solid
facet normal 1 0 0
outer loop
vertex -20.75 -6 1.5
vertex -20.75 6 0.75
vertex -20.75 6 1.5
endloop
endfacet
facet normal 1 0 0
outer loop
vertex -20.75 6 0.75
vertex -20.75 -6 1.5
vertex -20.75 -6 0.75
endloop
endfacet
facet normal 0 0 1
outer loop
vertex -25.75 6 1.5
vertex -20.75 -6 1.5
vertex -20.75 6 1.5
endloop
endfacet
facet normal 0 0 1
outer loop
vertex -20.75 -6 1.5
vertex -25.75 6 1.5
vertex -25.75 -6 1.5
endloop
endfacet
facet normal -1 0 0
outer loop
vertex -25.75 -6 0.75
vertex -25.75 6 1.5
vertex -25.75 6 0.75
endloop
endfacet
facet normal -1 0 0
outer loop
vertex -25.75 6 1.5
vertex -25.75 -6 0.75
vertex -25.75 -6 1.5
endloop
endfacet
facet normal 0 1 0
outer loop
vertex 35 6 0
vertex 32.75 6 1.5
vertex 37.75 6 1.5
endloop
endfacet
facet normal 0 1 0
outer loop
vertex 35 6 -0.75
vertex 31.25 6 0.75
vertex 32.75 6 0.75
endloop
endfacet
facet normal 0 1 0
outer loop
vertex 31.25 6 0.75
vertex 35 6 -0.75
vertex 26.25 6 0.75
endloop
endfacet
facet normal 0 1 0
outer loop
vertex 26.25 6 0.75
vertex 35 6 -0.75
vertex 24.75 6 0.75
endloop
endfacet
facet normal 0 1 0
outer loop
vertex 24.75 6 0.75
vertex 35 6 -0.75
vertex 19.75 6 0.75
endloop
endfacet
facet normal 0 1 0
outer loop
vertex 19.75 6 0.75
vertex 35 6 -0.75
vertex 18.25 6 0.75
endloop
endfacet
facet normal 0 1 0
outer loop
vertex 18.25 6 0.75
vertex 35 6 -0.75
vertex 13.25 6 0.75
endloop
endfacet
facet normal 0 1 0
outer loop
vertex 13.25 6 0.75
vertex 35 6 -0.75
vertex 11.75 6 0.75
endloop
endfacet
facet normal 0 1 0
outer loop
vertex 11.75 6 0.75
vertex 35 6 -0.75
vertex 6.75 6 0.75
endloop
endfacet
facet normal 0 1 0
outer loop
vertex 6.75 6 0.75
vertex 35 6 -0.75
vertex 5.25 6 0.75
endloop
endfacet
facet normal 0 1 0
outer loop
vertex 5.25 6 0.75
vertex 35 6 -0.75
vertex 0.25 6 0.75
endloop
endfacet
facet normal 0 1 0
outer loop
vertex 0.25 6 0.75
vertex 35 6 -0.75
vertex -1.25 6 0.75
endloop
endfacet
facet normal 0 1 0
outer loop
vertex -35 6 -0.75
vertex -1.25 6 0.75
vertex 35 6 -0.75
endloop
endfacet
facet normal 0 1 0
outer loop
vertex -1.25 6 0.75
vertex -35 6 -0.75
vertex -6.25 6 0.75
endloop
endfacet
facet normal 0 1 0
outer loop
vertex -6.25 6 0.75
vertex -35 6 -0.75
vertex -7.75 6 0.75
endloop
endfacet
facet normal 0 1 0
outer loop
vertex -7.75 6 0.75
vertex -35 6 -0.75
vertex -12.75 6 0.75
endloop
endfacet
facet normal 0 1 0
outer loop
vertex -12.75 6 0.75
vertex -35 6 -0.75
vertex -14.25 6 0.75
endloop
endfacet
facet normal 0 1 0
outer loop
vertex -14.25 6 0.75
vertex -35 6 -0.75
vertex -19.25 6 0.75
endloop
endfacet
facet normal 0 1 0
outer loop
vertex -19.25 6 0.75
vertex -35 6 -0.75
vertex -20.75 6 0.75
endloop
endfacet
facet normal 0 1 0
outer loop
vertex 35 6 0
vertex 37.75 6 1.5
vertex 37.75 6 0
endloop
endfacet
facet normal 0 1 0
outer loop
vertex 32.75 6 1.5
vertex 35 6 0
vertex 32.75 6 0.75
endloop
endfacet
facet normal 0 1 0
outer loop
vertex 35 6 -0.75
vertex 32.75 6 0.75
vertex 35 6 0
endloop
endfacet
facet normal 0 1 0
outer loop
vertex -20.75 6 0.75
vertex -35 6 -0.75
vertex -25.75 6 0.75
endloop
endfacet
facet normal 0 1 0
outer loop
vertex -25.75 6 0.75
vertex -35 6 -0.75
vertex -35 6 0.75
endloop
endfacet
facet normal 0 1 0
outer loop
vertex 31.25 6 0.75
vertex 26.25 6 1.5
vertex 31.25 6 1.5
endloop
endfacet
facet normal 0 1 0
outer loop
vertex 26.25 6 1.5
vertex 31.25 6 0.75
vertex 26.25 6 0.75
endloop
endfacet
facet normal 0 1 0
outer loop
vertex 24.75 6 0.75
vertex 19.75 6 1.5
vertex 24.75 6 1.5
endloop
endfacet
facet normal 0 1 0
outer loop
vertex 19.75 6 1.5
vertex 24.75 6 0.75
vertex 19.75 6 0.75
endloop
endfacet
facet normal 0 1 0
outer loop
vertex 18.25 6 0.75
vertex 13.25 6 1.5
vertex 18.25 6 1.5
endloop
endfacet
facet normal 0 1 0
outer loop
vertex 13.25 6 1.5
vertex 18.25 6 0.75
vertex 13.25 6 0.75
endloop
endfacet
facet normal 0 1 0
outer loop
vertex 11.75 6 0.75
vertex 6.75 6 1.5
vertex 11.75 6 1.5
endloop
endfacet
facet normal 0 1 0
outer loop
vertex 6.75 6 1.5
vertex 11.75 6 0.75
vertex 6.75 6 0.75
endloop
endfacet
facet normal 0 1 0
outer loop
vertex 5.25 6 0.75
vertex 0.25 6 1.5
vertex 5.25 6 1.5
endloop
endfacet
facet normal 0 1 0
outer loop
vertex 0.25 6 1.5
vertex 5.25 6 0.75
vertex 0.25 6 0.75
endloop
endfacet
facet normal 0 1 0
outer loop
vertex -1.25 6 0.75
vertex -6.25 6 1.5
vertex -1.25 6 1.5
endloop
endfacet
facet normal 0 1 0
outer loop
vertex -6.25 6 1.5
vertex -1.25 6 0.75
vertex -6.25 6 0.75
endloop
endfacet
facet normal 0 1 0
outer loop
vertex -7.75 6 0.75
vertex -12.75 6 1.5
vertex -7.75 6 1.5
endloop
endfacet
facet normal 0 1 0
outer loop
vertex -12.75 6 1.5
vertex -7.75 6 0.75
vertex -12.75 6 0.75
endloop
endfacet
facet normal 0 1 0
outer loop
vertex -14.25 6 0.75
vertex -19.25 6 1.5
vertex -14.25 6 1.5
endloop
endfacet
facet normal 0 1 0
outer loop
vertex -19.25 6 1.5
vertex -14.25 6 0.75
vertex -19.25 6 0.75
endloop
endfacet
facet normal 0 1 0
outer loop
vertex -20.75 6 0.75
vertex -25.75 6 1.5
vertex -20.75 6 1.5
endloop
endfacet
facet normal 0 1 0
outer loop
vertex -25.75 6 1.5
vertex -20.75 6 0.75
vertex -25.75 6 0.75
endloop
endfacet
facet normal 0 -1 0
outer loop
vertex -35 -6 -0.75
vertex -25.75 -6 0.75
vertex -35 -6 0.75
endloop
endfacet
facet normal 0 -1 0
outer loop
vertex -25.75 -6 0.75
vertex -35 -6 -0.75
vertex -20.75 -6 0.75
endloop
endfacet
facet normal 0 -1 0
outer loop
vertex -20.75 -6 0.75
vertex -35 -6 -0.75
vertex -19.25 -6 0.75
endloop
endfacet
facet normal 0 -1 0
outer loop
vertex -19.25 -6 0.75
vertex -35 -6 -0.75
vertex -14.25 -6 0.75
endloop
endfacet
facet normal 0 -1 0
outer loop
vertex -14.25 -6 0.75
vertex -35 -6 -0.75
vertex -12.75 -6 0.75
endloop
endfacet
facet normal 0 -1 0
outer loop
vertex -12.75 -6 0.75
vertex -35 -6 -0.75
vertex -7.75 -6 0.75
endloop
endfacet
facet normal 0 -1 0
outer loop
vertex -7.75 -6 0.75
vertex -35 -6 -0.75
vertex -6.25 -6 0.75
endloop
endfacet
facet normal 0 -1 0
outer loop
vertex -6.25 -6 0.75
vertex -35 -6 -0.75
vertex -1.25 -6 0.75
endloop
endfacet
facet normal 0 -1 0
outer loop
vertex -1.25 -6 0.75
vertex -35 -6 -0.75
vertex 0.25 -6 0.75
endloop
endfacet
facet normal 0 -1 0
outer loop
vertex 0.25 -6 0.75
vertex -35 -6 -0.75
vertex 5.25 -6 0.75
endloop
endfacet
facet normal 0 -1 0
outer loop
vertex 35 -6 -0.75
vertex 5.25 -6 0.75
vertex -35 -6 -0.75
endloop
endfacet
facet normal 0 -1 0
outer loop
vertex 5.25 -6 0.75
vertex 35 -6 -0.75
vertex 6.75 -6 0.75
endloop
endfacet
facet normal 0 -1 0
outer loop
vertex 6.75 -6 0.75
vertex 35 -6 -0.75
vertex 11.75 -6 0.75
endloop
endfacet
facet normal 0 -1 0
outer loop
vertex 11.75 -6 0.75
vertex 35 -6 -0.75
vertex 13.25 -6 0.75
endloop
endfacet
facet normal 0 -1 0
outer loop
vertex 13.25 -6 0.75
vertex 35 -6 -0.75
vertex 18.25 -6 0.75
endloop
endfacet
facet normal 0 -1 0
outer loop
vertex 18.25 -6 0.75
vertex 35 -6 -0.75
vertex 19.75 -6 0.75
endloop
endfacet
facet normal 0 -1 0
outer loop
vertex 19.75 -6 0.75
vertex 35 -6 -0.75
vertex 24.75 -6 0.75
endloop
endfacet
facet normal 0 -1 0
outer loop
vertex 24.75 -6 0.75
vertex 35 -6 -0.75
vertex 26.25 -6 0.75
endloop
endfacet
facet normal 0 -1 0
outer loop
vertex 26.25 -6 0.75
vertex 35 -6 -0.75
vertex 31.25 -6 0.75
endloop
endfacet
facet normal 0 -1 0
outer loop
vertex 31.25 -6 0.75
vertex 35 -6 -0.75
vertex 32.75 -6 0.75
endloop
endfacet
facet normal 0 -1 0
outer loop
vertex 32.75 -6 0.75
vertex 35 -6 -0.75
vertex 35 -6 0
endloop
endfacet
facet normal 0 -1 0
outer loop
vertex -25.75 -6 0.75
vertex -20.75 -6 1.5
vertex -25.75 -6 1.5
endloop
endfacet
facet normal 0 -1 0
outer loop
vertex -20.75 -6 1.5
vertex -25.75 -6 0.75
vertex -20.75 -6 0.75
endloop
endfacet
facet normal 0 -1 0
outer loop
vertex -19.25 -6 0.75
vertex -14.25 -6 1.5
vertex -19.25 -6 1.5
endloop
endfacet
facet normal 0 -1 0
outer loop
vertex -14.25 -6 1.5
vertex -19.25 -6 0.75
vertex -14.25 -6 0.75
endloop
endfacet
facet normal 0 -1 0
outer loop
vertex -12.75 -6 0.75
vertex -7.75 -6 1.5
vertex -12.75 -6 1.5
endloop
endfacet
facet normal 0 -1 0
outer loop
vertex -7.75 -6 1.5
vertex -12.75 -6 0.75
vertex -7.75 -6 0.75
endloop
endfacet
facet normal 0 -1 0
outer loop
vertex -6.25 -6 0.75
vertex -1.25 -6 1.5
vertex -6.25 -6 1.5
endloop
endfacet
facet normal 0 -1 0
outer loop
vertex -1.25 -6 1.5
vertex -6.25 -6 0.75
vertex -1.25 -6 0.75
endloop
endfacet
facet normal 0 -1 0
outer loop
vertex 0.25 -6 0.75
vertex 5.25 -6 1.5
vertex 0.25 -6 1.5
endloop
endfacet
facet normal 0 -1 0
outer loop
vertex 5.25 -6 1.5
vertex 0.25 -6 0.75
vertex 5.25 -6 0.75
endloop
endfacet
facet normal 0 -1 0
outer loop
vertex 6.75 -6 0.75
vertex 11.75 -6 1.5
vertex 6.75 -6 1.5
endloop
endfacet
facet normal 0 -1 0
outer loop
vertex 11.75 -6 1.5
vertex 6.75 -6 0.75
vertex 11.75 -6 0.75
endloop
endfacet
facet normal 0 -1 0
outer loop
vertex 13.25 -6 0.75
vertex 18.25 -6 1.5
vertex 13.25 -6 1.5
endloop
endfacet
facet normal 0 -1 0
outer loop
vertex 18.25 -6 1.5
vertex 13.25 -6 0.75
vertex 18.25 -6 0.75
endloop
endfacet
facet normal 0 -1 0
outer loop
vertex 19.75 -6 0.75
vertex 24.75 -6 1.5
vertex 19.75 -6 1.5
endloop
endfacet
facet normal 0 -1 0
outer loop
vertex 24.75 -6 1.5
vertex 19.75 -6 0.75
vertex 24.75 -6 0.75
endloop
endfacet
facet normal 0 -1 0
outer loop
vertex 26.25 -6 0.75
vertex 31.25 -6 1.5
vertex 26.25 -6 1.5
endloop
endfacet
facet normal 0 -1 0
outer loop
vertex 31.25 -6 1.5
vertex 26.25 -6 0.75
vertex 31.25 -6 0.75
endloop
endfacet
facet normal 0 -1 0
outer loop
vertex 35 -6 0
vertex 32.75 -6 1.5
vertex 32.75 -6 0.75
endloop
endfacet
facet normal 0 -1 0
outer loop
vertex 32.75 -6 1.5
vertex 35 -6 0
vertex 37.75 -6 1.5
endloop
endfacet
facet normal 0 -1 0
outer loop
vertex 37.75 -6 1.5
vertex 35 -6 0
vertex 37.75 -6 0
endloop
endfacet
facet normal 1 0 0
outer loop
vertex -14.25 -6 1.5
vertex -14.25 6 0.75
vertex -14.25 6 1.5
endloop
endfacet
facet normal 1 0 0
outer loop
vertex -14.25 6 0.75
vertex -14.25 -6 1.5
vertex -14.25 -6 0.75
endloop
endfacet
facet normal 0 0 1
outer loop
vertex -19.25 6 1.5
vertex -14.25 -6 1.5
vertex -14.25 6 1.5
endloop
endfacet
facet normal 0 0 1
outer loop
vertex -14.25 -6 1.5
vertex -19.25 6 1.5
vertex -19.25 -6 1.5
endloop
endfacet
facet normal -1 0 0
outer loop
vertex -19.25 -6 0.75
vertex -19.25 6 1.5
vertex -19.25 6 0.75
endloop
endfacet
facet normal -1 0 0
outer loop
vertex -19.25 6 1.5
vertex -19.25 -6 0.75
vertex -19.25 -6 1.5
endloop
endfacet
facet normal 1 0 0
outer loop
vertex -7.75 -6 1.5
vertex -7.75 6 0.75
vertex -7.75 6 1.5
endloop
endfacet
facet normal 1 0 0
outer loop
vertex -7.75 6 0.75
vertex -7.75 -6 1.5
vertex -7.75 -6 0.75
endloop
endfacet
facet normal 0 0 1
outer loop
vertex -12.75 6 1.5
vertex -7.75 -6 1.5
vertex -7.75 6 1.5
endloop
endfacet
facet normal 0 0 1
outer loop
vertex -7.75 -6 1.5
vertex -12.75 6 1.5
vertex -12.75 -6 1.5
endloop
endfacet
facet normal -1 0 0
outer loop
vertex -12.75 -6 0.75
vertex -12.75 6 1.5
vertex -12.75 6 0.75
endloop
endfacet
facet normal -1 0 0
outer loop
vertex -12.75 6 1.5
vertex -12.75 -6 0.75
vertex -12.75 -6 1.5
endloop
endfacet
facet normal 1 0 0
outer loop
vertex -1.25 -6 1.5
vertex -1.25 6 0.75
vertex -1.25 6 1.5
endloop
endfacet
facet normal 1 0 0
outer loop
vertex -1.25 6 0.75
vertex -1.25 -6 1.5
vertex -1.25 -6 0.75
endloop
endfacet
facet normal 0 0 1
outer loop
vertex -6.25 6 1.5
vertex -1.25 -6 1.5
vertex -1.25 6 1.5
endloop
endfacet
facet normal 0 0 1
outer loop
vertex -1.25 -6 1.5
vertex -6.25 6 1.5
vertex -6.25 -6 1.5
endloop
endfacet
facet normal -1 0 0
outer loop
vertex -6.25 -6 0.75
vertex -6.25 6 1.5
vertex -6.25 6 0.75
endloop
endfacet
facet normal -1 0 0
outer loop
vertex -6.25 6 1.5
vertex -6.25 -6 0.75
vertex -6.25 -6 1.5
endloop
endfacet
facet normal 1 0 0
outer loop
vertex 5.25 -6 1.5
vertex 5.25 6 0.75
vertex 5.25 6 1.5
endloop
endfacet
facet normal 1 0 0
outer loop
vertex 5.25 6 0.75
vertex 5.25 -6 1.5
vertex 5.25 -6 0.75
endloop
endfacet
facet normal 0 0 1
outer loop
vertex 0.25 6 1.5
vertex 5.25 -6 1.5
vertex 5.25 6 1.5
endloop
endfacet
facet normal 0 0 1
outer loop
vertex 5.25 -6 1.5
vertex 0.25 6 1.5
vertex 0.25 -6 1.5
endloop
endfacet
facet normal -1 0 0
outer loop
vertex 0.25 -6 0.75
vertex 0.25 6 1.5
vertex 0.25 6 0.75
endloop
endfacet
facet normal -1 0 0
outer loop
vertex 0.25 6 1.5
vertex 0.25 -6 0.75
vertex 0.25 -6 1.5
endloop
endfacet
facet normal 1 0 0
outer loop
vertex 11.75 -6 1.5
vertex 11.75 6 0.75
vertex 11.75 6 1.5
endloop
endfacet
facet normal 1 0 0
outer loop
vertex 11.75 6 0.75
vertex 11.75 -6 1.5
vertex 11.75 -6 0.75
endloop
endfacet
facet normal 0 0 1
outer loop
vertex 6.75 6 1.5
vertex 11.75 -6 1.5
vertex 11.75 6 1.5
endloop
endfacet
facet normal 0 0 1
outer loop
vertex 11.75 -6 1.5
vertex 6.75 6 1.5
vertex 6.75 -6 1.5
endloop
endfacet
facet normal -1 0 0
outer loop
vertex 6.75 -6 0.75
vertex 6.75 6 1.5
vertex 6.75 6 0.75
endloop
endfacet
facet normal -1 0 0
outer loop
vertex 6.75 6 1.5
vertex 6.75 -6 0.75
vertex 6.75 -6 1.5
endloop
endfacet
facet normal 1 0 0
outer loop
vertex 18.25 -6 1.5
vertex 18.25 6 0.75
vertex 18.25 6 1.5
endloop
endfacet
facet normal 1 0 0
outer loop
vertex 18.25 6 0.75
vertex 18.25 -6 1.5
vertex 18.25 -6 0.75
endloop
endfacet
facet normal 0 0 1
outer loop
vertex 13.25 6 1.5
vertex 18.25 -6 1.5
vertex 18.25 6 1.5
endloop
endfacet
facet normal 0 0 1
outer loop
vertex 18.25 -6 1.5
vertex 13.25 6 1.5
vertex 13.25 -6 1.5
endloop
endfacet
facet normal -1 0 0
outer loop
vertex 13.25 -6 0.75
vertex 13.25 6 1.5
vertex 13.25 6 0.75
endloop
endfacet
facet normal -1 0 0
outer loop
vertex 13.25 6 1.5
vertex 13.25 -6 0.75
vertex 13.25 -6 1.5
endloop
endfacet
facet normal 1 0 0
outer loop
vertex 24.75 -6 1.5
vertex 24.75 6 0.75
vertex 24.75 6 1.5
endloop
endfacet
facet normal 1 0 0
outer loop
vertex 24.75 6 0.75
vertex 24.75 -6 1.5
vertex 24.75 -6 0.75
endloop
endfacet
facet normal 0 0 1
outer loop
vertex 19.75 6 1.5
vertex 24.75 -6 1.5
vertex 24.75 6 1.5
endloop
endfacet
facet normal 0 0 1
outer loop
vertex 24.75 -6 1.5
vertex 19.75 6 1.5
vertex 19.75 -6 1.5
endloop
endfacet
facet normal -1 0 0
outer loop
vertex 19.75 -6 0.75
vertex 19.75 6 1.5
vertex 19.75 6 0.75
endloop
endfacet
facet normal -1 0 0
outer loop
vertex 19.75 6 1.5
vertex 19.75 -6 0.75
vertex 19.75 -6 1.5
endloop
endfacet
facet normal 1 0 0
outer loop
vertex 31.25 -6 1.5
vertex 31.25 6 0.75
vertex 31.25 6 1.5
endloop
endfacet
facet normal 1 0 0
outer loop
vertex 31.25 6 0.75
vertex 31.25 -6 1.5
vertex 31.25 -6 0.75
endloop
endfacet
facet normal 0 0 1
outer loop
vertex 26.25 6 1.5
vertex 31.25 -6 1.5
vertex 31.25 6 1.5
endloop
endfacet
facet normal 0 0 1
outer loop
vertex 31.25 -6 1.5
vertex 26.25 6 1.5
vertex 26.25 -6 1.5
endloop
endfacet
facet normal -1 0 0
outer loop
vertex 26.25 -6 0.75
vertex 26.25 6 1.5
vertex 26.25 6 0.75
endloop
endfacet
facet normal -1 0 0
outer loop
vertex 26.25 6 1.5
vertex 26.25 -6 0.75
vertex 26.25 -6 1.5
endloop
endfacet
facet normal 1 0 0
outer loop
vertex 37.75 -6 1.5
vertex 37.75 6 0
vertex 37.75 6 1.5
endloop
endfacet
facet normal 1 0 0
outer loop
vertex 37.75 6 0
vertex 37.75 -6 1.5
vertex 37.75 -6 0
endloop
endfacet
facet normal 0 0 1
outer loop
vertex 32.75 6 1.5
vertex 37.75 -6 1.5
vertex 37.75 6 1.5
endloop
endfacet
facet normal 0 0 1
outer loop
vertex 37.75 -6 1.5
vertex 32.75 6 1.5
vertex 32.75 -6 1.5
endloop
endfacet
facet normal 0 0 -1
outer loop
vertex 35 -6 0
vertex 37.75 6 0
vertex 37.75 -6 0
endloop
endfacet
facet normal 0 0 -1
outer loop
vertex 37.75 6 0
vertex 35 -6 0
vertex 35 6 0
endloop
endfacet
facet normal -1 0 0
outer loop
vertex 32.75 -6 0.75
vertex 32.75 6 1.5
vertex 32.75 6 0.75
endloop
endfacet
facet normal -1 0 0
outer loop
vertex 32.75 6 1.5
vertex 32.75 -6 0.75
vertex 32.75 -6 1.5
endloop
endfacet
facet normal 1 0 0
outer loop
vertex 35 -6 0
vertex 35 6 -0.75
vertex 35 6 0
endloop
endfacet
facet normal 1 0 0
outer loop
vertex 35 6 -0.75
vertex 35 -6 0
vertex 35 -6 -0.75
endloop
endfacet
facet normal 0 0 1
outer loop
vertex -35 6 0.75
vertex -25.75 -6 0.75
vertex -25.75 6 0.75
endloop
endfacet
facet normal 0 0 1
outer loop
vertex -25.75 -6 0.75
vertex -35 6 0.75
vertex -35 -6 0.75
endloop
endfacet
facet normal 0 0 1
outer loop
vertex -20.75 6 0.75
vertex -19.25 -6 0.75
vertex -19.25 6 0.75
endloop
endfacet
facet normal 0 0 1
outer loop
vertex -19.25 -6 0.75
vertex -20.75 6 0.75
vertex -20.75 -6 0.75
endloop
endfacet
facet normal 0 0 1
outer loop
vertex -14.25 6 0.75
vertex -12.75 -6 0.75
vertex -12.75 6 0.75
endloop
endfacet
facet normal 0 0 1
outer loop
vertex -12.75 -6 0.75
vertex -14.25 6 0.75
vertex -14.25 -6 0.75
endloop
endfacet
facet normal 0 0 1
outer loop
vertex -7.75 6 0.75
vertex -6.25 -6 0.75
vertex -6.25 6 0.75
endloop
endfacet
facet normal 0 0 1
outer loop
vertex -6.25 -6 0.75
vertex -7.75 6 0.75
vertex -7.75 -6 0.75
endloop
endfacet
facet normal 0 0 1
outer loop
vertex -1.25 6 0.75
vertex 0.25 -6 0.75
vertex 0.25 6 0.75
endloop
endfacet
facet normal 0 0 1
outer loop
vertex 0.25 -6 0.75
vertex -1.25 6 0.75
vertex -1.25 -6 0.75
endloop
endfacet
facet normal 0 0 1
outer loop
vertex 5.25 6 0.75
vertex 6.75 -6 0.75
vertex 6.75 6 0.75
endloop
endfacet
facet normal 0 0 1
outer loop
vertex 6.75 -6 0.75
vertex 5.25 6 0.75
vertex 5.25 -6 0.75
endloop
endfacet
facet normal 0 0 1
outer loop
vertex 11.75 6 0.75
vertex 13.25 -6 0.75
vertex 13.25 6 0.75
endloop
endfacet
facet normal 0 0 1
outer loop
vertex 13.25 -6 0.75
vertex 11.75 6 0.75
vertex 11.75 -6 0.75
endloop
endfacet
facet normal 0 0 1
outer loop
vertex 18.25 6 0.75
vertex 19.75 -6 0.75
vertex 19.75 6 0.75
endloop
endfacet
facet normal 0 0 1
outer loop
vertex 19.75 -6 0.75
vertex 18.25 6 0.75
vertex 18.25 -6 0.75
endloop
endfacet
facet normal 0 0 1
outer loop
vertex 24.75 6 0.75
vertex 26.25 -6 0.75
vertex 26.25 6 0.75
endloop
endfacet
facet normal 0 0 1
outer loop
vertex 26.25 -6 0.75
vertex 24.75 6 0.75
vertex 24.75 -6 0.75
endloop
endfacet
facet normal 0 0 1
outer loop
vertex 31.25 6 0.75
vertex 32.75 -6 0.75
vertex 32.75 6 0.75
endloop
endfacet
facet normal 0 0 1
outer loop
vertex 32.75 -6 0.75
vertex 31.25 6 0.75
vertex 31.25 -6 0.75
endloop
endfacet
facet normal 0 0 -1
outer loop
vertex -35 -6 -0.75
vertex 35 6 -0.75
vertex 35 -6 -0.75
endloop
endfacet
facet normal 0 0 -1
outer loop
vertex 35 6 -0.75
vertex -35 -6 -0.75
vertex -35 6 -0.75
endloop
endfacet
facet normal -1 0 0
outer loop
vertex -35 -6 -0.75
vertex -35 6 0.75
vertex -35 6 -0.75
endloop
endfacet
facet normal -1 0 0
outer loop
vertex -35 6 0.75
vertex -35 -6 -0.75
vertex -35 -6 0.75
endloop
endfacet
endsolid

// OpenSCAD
// Dimensions for 10-well agarose gel comb
// Units: millimetres

// Overall plate thickness (Z direction)
thick = 1.5;

// Spine dimensions
spine_len = 70;      // Length along X
spine_wid = 12;      // Width along Y

// Tooth dimensions
tooth_wid = 5.0;     // Width along X
tooth_len = 12;      // Length along Y (hanging in -Y)

// Gap between teeth
gap_wid = 1.5;       // Gap along X

// Number of teeth
num_teeth = 10;

// Calculate total width of teeth + gaps
// Total width = num_teeth * tooth_wid + (num_teeth - 1) * gap_wid
total_tooth_width = num_teeth * tooth_wid + (num_teeth - 1) * gap_wid;

// Centering the tooth row on the spine in X
// Spine is centered at X=0, so we shift the tooth row to align with spine center
tooth_row_offset_x = (spine_wid - total_tooth_width) / 2;

// Calculate the Y position of the teeth
// Spine extends from Y = -spine_wid/2 to Y = +spine_wid/2
// Teeth hang in -Y direction from the spine edge (Y = -spine_wid/2)
// Tooth length is 12mm, so they extend from Y = -spine_wid/2 down to Y = -spine_wid/2 - 12
tooth_start_y = -spine_wid / 2;
tooth_end_y = tooth_start_y - tooth_len;

// Build the comb
module comb() {
    // 1. Create the spine (flat plate)
    // Centered at origin, lying on XY plane (Z=0 to Z=thick)
    translate([0, 0, 0])
        cube([spine_len, spine_wid, thick], center = true);

    // 2. Create the teeth
    // We use a loop to create each tooth
    for (i = [0 : num_teeth - 1]) {
        // Calculate X position for this tooth
        // The row is centered, so we start at tooth_row_offset_x
        // Each tooth is spaced by (tooth_wid + gap_wid)
        tooth_x = tooth_row_offset_x + i * (tooth_wid + gap_wid);
        
        // Create a single tooth
        translate([tooth_x, tooth_start_y, 0])
            cube([tooth_wid, tooth_len, thick], center = false);
    }
}

// Final assembly
comb();
